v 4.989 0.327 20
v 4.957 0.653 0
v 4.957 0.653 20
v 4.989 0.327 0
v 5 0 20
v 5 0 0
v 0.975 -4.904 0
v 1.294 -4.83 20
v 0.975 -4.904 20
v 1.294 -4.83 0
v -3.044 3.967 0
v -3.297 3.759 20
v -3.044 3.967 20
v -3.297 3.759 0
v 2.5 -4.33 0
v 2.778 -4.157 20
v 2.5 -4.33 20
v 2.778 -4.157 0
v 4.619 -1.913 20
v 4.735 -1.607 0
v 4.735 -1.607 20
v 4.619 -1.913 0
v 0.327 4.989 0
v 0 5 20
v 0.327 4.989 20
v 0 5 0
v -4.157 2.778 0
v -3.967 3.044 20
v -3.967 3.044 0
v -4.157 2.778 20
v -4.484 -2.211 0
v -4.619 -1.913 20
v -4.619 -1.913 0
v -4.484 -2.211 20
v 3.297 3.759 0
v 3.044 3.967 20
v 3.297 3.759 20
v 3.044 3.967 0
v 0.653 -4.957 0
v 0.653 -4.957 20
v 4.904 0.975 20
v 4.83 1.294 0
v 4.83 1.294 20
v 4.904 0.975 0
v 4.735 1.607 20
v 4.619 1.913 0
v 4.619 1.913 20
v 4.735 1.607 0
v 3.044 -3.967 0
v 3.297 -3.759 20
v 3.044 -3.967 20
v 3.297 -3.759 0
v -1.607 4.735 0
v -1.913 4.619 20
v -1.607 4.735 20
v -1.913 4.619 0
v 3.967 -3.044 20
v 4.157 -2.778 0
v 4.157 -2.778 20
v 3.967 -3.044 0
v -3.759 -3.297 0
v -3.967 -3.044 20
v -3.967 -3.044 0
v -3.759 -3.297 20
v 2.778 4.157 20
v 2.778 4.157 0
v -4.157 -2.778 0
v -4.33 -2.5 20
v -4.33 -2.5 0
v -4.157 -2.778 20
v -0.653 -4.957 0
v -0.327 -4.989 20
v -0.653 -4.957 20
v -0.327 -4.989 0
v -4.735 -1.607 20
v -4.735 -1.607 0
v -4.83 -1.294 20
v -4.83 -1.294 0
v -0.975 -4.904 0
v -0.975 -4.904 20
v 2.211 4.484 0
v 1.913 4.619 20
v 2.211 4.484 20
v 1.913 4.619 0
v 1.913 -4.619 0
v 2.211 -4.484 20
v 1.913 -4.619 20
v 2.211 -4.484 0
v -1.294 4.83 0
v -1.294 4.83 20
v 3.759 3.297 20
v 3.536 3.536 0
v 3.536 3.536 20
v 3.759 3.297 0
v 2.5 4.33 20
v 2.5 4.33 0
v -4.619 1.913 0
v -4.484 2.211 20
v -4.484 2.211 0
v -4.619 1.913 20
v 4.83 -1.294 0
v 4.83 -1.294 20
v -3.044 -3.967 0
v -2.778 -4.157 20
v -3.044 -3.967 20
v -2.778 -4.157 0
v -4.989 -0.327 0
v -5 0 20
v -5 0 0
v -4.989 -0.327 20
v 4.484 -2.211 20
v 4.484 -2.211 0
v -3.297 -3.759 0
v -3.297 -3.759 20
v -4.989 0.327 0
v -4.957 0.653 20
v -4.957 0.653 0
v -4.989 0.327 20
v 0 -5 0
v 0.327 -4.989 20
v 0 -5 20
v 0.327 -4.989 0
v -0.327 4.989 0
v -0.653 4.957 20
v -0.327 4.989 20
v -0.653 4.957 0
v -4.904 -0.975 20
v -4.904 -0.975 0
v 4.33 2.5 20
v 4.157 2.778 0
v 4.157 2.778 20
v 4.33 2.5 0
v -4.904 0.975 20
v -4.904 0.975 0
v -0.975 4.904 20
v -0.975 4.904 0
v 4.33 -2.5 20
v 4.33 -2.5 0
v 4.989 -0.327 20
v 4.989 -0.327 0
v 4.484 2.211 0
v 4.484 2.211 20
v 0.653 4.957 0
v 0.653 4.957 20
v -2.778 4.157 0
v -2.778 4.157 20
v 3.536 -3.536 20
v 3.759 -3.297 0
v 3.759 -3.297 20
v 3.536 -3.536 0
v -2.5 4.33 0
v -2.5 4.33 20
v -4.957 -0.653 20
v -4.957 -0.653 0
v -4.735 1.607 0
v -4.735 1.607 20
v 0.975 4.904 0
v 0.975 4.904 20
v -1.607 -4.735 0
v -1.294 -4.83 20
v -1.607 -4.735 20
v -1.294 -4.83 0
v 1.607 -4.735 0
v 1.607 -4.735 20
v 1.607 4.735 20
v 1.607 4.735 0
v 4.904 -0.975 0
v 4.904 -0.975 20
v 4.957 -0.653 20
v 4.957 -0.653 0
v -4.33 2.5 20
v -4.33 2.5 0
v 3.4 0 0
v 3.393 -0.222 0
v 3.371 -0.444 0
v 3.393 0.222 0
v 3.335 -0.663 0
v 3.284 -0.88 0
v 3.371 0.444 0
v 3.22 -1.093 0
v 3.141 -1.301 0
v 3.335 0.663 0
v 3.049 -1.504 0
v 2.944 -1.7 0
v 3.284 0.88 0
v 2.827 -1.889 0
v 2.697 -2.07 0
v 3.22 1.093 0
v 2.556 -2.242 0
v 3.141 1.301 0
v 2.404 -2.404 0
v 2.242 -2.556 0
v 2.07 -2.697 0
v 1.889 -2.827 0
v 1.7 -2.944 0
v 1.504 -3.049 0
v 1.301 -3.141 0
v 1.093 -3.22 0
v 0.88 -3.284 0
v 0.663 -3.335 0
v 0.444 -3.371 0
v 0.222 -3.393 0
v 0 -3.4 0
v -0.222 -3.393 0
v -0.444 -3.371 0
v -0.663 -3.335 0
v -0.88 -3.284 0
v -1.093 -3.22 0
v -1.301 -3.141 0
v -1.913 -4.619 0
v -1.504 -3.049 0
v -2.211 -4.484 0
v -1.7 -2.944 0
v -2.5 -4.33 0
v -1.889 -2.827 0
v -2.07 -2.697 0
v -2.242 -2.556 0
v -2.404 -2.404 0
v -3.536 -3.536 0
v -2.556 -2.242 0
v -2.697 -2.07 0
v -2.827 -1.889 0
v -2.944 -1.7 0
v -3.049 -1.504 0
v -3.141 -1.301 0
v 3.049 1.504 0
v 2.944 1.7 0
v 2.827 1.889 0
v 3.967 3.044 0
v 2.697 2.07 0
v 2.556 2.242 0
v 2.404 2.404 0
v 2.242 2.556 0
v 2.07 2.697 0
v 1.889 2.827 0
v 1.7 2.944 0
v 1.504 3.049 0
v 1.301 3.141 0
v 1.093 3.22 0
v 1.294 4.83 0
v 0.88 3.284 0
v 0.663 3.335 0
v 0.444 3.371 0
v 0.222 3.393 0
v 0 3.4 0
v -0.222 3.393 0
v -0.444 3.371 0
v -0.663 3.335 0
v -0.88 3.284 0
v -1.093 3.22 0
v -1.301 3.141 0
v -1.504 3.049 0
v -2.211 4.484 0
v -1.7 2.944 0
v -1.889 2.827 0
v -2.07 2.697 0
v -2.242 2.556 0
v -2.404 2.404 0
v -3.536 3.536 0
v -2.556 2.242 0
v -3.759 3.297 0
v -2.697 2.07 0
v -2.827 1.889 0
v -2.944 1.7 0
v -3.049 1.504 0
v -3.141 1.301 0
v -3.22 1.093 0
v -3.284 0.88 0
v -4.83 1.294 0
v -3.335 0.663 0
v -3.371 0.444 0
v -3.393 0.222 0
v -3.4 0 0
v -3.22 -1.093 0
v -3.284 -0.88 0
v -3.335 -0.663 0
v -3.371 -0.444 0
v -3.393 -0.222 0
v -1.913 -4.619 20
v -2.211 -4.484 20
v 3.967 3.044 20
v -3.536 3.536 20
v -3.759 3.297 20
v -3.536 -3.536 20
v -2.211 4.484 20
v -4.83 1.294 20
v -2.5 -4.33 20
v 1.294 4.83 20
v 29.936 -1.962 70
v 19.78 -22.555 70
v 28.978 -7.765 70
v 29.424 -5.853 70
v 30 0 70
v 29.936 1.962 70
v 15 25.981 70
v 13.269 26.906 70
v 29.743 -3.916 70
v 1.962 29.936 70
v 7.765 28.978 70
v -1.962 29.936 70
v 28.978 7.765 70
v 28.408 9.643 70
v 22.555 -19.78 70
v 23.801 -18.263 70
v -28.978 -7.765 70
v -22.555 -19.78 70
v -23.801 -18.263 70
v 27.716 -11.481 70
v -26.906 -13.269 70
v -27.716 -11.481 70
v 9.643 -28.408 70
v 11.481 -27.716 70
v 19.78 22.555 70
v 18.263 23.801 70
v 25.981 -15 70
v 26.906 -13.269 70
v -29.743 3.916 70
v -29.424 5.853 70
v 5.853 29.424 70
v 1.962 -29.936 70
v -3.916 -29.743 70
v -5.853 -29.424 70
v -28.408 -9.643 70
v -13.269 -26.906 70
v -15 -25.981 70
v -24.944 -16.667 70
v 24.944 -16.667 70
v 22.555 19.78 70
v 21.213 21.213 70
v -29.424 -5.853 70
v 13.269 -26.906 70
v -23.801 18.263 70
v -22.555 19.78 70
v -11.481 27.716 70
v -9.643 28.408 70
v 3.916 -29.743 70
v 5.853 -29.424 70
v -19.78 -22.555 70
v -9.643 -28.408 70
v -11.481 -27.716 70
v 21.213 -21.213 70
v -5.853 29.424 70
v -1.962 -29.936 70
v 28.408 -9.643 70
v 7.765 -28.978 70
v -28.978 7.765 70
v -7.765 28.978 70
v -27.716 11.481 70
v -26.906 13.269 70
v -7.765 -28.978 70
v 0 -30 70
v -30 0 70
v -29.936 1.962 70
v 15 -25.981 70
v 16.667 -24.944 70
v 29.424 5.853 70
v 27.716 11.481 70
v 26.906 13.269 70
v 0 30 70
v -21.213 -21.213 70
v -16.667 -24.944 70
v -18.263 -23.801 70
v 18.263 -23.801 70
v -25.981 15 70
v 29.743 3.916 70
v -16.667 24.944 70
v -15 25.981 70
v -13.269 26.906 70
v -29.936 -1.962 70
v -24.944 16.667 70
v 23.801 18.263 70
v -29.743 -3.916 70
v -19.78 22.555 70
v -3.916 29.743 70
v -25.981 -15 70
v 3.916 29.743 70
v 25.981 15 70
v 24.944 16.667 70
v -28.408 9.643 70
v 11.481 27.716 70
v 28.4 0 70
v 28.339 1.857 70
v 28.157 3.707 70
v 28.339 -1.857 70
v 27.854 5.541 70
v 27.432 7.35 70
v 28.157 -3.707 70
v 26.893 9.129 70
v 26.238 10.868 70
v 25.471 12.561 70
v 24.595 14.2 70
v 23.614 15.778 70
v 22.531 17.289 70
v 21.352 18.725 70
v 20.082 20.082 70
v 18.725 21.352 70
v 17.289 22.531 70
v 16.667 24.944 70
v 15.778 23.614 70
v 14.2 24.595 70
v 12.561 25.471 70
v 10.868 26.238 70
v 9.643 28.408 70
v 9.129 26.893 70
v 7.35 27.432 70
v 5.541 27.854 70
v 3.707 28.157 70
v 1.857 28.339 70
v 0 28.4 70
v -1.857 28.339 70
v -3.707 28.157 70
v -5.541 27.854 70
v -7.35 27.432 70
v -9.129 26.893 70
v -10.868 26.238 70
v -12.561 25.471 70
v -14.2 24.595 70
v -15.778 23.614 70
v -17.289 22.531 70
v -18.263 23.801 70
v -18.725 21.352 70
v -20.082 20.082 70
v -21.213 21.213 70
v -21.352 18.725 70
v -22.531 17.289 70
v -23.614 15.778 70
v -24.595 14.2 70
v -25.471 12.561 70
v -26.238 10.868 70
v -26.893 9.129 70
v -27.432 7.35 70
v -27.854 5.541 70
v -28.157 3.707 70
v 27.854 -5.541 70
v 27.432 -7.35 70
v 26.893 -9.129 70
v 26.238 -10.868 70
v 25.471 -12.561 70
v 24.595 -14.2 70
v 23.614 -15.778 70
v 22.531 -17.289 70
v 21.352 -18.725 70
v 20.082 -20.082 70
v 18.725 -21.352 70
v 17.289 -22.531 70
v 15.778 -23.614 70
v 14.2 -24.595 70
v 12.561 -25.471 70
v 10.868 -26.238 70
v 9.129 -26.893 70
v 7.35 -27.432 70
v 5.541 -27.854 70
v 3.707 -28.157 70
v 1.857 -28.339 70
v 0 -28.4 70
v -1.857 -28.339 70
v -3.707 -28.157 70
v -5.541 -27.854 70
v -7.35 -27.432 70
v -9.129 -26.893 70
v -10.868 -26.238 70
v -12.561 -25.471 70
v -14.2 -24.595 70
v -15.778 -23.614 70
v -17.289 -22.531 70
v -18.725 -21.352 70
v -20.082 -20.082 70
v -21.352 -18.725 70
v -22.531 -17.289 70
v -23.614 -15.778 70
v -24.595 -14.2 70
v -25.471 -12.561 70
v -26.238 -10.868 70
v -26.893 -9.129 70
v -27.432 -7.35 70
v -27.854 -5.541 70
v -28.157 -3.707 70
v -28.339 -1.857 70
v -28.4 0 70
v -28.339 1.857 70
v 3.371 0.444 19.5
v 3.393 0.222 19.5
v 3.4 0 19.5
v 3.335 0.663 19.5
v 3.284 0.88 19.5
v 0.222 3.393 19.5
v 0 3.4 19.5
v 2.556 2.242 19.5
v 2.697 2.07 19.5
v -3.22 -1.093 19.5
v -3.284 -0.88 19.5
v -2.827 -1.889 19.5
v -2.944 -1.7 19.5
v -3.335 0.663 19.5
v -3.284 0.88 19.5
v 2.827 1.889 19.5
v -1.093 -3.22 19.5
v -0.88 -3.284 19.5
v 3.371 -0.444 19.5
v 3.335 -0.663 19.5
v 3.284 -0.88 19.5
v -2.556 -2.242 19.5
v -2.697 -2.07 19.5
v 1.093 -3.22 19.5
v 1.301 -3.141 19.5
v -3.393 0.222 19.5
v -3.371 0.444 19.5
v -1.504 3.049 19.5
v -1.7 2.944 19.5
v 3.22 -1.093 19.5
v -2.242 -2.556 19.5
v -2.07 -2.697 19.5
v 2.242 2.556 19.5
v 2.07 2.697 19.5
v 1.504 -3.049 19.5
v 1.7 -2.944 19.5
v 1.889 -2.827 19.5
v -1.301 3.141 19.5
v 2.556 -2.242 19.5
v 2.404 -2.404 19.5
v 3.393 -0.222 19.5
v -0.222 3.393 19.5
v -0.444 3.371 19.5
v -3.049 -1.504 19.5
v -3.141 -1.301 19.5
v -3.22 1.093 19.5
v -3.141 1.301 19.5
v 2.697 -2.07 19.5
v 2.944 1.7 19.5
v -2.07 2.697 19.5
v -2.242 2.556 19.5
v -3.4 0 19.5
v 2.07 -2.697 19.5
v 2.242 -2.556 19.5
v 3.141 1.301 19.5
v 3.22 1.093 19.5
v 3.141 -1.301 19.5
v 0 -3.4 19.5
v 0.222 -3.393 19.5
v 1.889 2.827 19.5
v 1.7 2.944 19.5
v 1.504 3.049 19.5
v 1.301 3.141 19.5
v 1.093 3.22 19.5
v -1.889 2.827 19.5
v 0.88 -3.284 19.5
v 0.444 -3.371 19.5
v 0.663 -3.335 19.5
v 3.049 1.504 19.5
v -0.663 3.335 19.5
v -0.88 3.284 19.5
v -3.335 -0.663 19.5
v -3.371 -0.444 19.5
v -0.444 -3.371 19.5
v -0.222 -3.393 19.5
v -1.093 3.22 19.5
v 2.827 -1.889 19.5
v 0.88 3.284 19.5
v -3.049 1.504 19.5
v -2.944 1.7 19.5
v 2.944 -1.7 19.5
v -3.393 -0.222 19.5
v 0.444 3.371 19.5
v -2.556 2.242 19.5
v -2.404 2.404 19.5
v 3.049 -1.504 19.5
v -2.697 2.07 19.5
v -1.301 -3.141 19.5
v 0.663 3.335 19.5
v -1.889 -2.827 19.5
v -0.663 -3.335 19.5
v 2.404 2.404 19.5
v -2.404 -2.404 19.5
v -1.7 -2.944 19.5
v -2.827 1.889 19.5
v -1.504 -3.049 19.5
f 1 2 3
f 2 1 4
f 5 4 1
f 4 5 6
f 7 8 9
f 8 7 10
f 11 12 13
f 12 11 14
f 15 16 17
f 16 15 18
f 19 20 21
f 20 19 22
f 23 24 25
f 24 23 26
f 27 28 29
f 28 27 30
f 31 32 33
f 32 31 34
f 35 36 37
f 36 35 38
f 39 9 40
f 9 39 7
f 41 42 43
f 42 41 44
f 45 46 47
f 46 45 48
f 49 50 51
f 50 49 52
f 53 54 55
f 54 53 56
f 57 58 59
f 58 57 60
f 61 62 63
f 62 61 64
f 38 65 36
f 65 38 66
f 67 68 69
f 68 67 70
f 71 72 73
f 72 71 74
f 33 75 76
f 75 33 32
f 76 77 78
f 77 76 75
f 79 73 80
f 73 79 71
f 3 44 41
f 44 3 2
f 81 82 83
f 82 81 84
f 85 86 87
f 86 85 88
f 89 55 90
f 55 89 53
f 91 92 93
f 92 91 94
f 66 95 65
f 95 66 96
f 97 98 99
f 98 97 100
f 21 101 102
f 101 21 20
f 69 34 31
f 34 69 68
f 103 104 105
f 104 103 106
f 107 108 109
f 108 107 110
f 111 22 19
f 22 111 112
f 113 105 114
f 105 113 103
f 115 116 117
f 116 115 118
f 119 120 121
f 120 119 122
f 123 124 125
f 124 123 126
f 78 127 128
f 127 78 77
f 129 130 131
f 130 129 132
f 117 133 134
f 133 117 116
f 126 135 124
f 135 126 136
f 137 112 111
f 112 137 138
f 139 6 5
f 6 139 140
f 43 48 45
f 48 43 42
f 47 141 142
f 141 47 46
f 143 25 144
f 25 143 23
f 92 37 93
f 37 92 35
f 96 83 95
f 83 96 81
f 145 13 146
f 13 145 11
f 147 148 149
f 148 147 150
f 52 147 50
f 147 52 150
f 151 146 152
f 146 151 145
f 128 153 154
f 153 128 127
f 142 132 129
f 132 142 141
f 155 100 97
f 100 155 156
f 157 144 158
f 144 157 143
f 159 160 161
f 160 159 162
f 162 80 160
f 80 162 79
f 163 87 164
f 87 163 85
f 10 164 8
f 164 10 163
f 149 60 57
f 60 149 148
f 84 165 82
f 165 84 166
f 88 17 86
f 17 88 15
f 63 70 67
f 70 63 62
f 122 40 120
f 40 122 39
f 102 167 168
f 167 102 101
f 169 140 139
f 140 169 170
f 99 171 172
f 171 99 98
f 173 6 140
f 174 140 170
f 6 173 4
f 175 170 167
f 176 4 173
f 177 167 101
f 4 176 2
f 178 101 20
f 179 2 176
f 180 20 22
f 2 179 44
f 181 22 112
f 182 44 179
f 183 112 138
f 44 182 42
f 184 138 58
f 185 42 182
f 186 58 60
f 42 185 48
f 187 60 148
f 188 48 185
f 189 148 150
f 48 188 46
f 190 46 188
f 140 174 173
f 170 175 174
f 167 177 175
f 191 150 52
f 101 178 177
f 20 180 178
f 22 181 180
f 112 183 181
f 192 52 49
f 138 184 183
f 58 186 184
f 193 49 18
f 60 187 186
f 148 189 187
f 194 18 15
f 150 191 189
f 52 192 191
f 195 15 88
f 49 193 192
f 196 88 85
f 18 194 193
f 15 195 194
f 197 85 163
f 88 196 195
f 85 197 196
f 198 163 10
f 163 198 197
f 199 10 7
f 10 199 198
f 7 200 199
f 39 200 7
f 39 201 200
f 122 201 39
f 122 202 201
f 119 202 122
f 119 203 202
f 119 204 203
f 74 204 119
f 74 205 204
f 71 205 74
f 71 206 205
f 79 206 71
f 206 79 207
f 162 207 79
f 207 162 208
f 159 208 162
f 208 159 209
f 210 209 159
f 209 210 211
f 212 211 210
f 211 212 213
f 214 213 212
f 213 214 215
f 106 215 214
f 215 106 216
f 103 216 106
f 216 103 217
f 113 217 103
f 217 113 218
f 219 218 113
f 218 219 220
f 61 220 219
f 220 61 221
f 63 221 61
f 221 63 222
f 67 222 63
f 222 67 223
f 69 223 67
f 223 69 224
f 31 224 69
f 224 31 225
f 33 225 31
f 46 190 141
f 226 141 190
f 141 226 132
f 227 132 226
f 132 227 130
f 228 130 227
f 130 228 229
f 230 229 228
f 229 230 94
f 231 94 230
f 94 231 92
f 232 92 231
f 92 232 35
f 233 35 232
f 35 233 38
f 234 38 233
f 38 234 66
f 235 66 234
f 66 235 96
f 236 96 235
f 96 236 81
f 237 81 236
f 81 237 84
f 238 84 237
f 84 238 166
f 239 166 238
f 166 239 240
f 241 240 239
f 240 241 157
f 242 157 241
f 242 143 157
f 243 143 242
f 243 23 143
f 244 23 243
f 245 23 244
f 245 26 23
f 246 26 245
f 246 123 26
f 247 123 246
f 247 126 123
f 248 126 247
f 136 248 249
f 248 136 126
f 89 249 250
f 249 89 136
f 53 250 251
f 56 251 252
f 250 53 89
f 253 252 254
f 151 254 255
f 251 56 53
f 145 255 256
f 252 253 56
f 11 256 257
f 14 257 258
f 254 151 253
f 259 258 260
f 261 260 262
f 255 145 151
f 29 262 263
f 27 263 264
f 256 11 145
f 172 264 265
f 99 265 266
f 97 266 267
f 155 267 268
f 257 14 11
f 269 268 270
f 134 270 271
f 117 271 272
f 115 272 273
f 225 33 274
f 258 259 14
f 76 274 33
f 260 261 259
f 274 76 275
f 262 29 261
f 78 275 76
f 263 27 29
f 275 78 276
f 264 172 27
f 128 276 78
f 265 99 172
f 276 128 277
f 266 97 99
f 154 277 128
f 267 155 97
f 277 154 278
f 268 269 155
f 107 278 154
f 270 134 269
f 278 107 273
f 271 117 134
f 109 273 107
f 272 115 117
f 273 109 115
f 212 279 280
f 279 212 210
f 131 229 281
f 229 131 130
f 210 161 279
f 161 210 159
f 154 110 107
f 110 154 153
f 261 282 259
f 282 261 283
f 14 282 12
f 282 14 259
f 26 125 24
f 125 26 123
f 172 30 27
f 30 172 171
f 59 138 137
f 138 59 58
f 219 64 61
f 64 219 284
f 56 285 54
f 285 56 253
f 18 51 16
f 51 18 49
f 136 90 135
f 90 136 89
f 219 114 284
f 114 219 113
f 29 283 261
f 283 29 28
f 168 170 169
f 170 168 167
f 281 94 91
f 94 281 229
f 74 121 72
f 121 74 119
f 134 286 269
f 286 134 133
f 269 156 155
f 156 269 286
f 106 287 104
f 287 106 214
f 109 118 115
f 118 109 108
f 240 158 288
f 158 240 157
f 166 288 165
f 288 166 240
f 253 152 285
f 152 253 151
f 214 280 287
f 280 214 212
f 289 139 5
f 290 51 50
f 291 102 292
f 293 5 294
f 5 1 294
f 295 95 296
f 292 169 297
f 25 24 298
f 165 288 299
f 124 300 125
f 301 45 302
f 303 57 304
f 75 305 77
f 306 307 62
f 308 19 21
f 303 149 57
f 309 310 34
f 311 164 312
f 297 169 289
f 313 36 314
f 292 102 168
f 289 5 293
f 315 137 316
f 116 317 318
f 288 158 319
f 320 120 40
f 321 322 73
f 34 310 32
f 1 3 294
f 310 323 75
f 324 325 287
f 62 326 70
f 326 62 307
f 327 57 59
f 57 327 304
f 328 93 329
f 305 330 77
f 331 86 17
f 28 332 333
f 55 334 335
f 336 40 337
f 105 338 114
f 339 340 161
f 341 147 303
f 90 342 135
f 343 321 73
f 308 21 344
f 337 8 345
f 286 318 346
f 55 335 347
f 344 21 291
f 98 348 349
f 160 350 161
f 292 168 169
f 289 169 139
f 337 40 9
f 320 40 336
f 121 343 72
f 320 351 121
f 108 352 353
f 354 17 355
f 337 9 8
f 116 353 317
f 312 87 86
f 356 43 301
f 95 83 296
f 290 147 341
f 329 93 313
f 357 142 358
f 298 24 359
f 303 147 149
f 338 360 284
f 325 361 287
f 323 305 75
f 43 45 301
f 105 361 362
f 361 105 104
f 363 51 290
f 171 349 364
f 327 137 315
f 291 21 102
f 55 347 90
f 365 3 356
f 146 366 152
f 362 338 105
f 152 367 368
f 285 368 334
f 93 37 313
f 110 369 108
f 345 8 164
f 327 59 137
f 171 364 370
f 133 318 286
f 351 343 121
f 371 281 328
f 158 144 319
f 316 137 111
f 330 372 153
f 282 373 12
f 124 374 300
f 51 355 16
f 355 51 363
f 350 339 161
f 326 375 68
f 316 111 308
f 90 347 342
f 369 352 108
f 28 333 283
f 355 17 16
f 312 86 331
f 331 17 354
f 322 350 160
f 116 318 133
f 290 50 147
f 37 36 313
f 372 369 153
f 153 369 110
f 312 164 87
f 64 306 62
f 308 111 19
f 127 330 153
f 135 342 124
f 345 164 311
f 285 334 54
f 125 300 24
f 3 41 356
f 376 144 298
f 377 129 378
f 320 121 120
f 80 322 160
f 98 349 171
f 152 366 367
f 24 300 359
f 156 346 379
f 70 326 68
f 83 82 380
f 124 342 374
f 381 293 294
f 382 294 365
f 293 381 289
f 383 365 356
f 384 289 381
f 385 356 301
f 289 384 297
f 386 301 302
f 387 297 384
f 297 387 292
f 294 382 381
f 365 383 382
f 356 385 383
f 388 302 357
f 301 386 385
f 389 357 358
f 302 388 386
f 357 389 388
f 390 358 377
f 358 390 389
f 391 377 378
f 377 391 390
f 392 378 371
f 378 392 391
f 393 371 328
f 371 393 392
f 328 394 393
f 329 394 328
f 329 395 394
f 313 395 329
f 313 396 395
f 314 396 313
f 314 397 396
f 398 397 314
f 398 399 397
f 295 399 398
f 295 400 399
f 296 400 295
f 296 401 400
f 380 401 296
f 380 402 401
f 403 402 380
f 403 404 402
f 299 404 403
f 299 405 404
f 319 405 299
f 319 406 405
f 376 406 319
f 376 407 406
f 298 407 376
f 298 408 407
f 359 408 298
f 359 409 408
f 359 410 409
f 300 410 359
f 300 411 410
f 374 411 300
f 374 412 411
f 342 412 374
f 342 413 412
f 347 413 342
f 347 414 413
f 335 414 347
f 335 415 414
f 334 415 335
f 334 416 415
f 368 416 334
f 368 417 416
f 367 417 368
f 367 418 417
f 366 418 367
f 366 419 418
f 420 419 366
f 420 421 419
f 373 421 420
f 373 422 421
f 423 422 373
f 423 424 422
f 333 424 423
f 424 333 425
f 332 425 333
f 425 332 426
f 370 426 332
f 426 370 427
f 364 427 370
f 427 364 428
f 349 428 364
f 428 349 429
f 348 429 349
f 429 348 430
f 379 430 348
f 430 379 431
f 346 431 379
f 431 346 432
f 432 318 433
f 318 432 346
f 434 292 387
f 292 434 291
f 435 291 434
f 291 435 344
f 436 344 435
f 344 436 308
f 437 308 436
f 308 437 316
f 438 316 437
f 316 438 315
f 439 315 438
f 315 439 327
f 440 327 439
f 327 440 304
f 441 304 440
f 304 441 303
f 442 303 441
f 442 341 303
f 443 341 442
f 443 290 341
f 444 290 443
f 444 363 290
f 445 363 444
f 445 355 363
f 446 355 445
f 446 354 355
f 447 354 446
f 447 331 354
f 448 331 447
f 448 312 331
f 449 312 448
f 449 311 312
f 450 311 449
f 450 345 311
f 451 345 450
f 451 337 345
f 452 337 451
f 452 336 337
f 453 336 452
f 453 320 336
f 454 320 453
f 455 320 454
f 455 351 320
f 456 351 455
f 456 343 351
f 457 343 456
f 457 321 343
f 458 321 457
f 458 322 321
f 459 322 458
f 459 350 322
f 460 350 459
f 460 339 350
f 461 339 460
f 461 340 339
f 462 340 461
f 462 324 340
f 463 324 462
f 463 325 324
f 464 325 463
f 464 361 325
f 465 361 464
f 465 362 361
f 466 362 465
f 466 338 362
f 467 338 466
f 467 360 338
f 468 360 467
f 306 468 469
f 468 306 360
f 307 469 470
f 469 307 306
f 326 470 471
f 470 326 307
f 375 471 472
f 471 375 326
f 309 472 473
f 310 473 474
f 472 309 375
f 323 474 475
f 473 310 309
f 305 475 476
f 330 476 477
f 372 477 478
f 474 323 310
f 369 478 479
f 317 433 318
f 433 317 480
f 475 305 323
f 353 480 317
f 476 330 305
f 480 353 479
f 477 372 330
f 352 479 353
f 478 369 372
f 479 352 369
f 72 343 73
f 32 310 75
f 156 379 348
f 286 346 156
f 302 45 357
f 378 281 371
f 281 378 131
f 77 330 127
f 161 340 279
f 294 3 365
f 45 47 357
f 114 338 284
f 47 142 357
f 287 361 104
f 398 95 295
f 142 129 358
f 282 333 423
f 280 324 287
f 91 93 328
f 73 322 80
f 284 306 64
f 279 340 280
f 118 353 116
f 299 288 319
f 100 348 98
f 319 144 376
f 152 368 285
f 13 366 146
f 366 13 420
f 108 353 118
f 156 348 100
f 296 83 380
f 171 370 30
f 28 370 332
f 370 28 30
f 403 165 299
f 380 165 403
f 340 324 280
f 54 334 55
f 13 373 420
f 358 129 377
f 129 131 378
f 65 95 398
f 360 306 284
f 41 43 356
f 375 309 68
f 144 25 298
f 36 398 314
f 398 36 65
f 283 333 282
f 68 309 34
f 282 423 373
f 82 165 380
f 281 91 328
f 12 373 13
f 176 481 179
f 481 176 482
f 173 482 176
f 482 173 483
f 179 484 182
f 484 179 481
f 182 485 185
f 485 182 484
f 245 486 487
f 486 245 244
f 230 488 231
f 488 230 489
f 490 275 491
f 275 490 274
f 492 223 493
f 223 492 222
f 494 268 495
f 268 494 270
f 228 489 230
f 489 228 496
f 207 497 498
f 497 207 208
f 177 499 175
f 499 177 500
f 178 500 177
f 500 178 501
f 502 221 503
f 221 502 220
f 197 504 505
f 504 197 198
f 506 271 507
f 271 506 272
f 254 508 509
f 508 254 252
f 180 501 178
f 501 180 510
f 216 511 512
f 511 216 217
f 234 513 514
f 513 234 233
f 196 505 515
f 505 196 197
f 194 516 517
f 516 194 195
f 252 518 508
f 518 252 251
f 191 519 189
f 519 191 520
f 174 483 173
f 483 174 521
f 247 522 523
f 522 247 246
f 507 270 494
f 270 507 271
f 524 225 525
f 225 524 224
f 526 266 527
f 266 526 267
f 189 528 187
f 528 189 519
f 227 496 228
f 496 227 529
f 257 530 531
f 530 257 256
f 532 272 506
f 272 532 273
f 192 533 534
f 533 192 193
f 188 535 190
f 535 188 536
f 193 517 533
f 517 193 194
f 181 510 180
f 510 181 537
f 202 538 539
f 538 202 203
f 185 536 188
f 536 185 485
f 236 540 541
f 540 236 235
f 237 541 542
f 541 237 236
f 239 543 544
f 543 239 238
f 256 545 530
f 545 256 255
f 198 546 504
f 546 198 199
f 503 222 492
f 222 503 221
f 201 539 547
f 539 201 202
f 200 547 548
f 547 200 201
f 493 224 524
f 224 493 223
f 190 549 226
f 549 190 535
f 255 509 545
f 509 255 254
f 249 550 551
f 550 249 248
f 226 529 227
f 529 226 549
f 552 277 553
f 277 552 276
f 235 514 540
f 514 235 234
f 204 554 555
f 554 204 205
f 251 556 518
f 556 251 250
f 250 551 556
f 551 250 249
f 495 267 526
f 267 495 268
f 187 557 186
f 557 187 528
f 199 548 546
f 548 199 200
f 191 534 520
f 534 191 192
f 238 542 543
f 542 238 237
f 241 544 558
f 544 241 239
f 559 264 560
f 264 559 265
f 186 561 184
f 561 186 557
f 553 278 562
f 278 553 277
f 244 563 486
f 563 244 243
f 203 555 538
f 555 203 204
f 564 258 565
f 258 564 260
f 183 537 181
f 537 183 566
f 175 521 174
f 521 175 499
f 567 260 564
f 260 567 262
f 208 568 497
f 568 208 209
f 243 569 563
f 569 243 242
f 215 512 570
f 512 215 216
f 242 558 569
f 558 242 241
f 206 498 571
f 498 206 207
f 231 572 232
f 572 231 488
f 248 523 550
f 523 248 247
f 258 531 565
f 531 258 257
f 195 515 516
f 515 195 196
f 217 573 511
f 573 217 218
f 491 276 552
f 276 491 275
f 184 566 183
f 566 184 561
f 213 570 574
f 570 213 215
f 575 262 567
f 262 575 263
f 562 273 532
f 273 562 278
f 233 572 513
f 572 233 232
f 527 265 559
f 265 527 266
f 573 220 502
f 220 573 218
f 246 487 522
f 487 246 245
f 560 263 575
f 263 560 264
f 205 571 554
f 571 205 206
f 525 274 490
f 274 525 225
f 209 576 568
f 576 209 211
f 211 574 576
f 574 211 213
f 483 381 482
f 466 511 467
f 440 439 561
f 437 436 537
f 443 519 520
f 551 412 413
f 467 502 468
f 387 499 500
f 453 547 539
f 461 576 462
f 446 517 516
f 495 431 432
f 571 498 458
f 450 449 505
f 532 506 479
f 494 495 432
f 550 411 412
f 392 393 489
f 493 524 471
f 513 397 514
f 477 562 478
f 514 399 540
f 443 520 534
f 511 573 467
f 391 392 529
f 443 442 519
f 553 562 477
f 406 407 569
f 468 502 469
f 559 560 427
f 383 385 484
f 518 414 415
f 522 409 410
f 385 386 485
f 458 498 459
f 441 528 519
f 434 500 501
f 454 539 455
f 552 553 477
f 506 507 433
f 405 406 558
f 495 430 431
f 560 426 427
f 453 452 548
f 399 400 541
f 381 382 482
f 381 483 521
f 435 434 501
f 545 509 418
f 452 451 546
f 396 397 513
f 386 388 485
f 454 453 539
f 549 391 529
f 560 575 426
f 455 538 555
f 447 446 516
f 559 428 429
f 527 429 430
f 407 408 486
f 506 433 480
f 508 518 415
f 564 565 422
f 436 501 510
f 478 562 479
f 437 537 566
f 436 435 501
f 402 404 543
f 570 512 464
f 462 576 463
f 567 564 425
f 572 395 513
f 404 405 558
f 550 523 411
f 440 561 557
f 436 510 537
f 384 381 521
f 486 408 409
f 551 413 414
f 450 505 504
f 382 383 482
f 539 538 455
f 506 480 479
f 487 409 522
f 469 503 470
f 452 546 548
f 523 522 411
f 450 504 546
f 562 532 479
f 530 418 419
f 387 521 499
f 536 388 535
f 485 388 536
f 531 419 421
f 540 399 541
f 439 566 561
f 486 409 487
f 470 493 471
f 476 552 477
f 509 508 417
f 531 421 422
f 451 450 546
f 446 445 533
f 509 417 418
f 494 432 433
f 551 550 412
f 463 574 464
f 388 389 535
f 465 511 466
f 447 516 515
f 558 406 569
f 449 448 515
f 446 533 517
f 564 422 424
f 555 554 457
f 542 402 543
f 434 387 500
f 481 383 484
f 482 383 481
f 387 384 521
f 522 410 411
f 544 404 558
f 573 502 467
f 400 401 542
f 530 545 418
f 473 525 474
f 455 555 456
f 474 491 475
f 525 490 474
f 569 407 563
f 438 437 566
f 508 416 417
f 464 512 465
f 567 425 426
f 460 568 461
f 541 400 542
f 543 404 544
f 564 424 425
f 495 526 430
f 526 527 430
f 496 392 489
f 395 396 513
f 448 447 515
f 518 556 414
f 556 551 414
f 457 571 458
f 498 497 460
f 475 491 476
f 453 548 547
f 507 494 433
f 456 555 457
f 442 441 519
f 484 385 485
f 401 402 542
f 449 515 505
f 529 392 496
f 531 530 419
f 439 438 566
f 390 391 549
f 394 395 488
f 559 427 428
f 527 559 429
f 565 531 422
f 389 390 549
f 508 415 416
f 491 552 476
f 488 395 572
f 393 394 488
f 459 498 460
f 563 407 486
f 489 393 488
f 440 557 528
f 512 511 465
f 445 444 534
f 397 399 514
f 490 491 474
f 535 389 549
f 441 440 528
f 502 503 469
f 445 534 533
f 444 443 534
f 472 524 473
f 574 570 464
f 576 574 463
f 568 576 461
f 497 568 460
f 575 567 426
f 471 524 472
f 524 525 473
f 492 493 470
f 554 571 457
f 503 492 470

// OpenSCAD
// Lab funnel - printed upright, open at top and bottom
// Units: mm

// ---- Parameters ----
spout_od      = 10;    // spout outer diameter
spout_len     = 20;    // spout length (z = 0 to 20)
cone_od_top   = 60;    // cone rim outer diameter (z = 50)
cone_od_bot   = 10;    // cone base outer diameter (z = 20)
wall          = 1.6;   // wall thickness everywhere
eps           = 0.5;   // cutter overshoot past faces

$fn = 96;

// ---- Model ----
difference() {
    union() {
        // Straight spout
        cylinder(d = spout_od, h = spout_len);
        // Cone from z = 20 to z = 50
        translate([0, 0, spout_len])
            cylinder(d1 = cone_od_bot, d2 = cone_od_top, h = cone_od_top - cone_od_bot);
    }
    // Bore: spout 6.8 mm, cone 56 mm at rim
    translate([0, 0, -eps])
        cylinder(d = spout_od - 2 * wall, h = spout_len + 2 * eps);
    translate([0, 0, spout_len - eps])
        cylinder(d1 = cone_od_bot - 2 * wall, d2 = cone_od_top - 2 * wall,
                 h = cone_od_top - cone_od_bot + eps);
}
